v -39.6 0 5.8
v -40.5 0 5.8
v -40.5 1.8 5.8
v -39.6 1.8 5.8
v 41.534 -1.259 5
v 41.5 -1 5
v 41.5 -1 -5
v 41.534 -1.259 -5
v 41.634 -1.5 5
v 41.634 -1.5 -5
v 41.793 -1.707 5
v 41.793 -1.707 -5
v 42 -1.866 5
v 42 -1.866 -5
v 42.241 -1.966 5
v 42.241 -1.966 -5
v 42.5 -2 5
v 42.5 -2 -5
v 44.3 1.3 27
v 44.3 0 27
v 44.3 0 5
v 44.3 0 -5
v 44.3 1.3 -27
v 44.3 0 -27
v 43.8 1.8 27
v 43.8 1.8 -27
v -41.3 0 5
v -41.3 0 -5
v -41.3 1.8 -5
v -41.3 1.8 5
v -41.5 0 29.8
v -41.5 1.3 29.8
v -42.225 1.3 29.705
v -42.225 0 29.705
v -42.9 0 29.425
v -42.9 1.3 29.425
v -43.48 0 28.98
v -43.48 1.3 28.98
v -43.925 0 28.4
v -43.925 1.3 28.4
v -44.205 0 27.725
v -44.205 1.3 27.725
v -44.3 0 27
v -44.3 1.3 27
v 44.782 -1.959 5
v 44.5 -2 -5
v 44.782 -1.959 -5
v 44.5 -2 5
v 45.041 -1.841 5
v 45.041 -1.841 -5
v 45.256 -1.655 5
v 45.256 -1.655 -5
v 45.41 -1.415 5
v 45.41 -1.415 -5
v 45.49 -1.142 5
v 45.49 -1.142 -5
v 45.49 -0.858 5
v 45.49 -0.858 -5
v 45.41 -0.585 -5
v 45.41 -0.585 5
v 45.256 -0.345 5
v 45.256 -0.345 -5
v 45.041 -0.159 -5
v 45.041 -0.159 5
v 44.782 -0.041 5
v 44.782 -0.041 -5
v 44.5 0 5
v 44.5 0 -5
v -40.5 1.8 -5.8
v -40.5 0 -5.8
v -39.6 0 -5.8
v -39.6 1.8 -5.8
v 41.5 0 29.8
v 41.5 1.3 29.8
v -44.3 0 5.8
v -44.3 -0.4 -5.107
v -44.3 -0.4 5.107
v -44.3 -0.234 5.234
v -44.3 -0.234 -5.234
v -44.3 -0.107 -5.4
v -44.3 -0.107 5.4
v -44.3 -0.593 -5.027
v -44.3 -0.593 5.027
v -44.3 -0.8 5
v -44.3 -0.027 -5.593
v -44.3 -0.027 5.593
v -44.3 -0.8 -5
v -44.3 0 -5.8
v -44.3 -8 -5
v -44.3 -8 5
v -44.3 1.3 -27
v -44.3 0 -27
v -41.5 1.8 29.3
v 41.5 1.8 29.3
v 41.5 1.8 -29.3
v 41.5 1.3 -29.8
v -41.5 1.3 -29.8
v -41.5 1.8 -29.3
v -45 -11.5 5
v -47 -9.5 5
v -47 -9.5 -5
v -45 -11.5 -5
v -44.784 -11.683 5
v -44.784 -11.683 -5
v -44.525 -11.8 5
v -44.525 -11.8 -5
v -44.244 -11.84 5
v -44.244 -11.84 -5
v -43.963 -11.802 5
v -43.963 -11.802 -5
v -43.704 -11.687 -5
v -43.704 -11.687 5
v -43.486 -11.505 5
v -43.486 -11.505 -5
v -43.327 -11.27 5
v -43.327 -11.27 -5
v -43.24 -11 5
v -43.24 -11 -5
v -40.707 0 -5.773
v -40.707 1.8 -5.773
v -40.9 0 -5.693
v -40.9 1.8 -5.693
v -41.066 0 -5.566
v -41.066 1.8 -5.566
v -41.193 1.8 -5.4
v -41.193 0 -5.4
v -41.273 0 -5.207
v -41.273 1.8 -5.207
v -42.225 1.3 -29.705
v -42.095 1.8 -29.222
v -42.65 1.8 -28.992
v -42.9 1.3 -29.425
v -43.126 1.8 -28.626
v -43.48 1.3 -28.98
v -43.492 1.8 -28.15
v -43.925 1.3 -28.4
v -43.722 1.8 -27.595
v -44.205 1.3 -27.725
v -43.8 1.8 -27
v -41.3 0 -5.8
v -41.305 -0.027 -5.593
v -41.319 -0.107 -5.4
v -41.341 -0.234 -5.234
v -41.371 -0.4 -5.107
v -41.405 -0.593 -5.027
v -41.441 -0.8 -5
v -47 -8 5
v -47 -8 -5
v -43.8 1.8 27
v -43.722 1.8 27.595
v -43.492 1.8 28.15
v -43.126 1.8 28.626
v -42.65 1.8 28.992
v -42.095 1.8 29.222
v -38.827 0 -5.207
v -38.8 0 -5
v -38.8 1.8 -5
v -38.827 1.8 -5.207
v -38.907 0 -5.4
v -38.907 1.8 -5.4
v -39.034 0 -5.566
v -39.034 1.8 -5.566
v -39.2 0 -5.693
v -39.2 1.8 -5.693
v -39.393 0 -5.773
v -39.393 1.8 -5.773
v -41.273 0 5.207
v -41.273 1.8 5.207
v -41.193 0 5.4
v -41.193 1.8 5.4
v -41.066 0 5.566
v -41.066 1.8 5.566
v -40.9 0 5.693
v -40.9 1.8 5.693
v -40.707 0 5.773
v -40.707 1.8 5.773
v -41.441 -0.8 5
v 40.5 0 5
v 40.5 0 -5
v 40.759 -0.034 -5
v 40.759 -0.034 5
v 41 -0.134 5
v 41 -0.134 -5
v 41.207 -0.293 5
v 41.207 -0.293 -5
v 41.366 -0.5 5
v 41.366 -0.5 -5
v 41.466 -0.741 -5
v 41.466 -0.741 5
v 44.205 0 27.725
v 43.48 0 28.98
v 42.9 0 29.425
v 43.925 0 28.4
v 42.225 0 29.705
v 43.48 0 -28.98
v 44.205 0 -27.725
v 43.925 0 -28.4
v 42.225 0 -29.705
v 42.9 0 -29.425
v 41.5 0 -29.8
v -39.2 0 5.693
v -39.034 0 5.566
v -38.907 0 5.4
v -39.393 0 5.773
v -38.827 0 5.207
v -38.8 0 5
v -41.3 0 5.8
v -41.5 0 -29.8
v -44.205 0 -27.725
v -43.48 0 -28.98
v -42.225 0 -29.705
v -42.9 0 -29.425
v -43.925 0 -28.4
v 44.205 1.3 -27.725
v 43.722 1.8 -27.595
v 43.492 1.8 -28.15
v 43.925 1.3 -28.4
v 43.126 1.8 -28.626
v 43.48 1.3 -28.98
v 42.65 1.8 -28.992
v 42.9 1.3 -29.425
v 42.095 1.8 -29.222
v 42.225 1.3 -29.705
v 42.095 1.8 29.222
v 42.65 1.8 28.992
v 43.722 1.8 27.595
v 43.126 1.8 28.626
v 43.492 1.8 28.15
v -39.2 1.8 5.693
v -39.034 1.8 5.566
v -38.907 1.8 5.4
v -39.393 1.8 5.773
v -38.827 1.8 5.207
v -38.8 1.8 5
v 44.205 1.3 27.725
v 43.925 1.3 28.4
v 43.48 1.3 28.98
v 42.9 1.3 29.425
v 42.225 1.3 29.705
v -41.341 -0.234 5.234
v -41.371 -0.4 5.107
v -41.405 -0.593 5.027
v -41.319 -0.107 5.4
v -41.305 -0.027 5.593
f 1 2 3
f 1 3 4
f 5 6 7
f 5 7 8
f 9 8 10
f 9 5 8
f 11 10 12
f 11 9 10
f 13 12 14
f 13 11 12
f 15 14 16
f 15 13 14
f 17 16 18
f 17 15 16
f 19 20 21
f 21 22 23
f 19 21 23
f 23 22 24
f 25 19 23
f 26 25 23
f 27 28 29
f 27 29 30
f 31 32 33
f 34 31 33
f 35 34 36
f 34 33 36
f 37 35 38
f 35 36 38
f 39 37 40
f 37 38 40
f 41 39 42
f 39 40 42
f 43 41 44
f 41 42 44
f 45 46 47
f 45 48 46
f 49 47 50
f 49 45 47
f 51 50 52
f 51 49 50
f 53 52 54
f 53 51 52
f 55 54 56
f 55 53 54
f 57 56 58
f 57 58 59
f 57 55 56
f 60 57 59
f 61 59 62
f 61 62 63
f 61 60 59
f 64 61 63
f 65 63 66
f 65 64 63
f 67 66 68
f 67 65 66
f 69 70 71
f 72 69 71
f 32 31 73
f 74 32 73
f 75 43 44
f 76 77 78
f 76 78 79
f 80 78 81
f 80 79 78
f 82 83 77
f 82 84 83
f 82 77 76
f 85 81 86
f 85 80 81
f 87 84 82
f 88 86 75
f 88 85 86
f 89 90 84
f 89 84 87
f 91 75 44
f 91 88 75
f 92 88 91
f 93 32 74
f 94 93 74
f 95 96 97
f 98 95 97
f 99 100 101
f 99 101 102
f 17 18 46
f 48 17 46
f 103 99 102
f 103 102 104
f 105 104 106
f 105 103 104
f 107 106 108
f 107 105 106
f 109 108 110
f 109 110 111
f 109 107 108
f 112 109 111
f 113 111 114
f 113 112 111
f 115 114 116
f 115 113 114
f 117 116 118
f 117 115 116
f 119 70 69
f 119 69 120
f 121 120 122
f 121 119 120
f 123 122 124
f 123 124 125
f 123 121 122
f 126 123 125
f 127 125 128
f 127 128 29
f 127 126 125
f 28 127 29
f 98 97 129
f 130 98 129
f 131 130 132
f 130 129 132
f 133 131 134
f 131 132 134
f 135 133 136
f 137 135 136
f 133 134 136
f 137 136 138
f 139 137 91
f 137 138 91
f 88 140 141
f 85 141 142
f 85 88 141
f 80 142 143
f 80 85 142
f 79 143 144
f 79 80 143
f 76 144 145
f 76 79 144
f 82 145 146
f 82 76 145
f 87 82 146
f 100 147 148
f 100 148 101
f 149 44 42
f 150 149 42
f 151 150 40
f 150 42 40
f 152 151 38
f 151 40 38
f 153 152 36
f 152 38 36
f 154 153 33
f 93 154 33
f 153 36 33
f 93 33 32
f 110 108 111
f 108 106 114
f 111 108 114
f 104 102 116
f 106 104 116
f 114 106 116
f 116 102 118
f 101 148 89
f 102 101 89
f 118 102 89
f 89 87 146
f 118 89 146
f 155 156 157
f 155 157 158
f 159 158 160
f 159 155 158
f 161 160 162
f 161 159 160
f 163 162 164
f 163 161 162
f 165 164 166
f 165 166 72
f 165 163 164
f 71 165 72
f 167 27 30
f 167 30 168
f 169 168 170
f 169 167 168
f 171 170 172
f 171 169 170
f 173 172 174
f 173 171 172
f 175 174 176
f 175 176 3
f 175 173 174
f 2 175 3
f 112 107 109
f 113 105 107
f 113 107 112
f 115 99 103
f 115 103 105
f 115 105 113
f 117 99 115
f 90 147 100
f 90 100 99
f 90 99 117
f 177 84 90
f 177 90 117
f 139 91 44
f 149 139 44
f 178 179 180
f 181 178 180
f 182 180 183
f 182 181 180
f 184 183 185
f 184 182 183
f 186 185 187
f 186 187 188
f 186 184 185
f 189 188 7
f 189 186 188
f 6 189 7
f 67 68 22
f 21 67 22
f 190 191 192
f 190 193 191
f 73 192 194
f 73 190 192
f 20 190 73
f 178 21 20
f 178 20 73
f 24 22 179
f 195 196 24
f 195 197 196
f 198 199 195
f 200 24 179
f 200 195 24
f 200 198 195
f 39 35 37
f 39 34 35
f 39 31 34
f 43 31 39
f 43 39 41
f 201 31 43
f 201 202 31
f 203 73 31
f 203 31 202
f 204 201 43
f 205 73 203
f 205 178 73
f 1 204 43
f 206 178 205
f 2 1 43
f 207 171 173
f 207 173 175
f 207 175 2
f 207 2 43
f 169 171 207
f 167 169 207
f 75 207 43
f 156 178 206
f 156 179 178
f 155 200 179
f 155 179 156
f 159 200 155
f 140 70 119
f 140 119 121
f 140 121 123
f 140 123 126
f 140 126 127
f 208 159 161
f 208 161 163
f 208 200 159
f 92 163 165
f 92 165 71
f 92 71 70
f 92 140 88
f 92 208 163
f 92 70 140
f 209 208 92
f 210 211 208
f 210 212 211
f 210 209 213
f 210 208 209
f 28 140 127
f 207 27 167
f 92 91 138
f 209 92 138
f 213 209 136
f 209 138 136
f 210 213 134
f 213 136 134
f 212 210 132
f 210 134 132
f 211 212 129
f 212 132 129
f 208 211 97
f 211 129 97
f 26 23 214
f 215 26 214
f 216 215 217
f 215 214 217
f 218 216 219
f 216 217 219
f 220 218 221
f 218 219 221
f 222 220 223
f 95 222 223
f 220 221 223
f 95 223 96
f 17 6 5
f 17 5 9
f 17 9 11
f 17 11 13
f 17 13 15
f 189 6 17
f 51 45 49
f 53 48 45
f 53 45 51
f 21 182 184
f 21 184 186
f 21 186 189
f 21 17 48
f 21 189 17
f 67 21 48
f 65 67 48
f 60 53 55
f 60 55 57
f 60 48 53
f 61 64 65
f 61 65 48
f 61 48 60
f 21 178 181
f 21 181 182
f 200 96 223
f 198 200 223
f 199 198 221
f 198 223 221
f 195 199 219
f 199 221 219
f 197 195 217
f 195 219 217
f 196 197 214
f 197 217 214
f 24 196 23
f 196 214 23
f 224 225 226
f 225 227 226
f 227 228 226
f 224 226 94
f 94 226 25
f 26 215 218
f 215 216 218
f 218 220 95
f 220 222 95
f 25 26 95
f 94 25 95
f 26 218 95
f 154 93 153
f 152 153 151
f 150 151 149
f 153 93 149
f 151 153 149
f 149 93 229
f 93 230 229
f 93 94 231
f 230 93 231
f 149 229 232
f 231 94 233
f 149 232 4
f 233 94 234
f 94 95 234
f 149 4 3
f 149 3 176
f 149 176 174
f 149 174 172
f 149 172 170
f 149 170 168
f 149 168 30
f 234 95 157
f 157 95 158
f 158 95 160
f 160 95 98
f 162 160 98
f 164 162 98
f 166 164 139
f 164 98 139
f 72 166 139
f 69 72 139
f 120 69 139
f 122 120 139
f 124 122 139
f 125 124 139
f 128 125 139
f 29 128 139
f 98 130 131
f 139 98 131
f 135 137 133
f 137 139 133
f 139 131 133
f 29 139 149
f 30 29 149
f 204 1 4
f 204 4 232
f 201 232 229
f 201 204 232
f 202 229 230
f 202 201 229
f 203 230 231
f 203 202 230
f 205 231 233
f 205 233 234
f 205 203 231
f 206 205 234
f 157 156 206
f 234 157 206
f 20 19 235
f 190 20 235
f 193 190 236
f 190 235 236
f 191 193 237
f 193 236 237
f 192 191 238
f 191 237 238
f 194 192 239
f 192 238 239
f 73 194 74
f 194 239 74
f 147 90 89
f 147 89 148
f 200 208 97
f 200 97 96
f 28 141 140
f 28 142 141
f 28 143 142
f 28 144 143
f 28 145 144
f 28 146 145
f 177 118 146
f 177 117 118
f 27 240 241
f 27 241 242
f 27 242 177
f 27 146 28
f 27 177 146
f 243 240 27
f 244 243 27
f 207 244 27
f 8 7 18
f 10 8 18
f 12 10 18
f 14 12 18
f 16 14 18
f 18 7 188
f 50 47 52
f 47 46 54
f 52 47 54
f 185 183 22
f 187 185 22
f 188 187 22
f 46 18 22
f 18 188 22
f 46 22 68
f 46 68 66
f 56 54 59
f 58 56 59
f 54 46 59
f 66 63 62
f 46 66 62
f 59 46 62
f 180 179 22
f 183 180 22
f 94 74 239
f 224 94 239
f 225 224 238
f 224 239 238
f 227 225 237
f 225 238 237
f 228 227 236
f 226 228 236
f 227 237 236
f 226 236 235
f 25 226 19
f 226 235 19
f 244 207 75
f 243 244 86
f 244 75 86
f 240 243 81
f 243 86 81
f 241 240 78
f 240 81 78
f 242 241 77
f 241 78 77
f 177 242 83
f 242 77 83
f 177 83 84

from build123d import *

# Parameters (mm, degrees)
SKIZZE1_W                       = 88.6
SKIZZE1_H                       = 59.6
AUFSATZ_LINEAR_AUSTRAGEN1_DEPTH = 1.8
SCHNITT_LINEAR_AUSTRAGEN1_DEPTH = 54.420688876
FASE1_SIZE                      = 0.5
AUFSATZ_LINEAR_AUSTRAGEN2_DEPTH = 5
AUFSATZ_LINEAR_AUSTRAGEN3_DEPTH = 5
VERRUNDUNG1_R                   = 0.8
SKIZZE5_W                       = 2.5
SKIZZE5_H                       = 11.6
SCHNITT_LINEAR_AUSTRAGEN2_DEPTH = 57.896671713
VERRUNDUNG2_R                   = 0.8


with BuildPart() as part:
    # Skizze1 → Aufsatz-Linear austragen1 (new body)
    with BuildSketch(Plane(origin=(0, 0, 0), x_dir=(1, 0, 0), z_dir=(0, 1, 0))):
        Rectangle(SKIZZE1_W, SKIZZE1_H)
    extrude(amount=AUFSATZ_LINEAR_AUSTRAGEN1_DEPTH)

    # Skizze2 → Schnitt-Linear austragen1 (cut, through all)
    with BuildSketch(Plane(origin=(0, 1.8, 0), x_dir=(1, 0, 0), z_dir=(0, 1, 0))):
        with BuildLine():
            Line((-44.3, -29.8), (-41.5, -29.8))
            ThreePointArc((-41.5, -29.8), (-43.479898987, -28.979898987), (-44.3, -27))
            Line((-44.3, -27), (-44.3, -29.8))
        make_face()
        with BuildLine():
            Line((41.5, -29.8), (44.3, -29.8))
            Line((44.3, -29.8), (44.3, -27))
            ThreePointArc((44.3, -27), (43.479898987, -28.979898987), (41.5, -29.8))
        make_face()
        with BuildLine():
            ThreePointArc((41.5, 29.8), (43.479898987, 28.979898987), (44.3, 27))
            Line((44.3, 27), (44.3, 29.8))
            Line((44.3, 29.8), (41.5, 29.8))
        make_face()
        with BuildLine():
            ThreePointArc((-44.3, 27), (-43.479898987, 28.979898987), (-41.5, 29.8))
            Line((-41.5, 29.8), (-44.3, 29.8))
            Line((-44.3, 29.8), (-44.3, 27))
        make_face()
    extrude(amount=-SCHNITT_LINEAR_AUSTRAGEN1_DEPTH, mode=Mode.SUBTRACT)

    # Fase1
    fase1_edges = [part.edges().sort_by_distance(p)[0] for p in [
        (44.3, 1.8, 0),
        (0, 1.8, -29.8),
        (-44.3, 1.8, 0),
        (0, 1.8, 29.8),
        (-43.479898987, 1.8, -28.979898987),
        (43.479898987, 1.8, -28.979898987),
        (43.479898987, 1.8, 28.979898987),
        (-43.479898987, 1.8, 28.979898987),
    ]]
    chamfer(fase1_edges, length=FASE1_SIZE)

    # Skizze3 → Aufsatz-Linear austragen2 (add, symmetric)
    with BuildSketch(Plane.XY):
        with BuildLine():
            Line((44.5, 0), (40.5, 0))
            ThreePointArc((40.5, 0), (41.207106781, -0.292893219), (41.5, -1))
            ThreePointArc((41.5, -1), (41.792893219, -1.707106781), (42.5, -2))
            Line((42.5, -2), (44.5, -2))
            ThreePointArc((44.5, -2), (45.5, -1), (44.5, 0))
        make_face()
    extrude(amount=AUFSATZ_LINEAR_AUSTRAGEN2_DEPTH, both=True)

    # Skizze4 → Aufsatz-Linear austragen3 (add, symmetric)
    with BuildSketch(Plane.XY):
        with BuildLine():
            Line((-44.3, 0), (-44.3, -8))
            Line((-44.3, -8), (-47, -8))
            Line((-47, -8), (-47, -9.5))
            Line((-47, -9.5), (-45, -11.5))
            ThreePointArc((-45, -11.5), (-43.963143632, -11.801551092), (-43.239596788, -11))
            Line((-43.239596788, -11), (-41.3, 0))
            Line((-41.3, 0), (-44.3, 0))
        make_face()
    extrude(amount=AUFSATZ_LINEAR_AUSTRAGEN3_DEPTH, both=True)

    # Verrundung1
    verrundung1_edges = [part.edges().sort_by_distance(p)[0] for p in [
        (-42.8, 0, -5),
        (-42.8, 0, 5),
    ]]
    fillet(verrundung1_edges, radius=VERRUNDUNG1_R)

    # Skizze5 → Schnitt-Linear austragen2 (cut, through all)
    with BuildSketch(Plane.XZ):
        with Locations((-40.05, 0)):
            Rectangle(SKIZZE5_W, SKIZZE5_H)
    extrude(amount=-SCHNITT_LINEAR_AUSTRAGEN2_DEPTH, mode=Mode.SUBTRACT)

    # Verrundung2
    # the kernel refuses this fillet: 0.8 mm, written as the material it adds along each edge
    with BuildSketch(Plane(origin=(-41.3, 0, -5.8), x_dir=(1, 0, 0), z_dir=(0, 1, 0))) as verrundung2_piece_1:
        with BuildLine():
            CenterArc((VERRUNDUNG2_R, -VERRUNDUNG2_R), VERRUNDUNG2_R, 90, 90)
            Line((0, -VERRUNDUNG2_R), (0, 0))
            Line((0, 0), (VERRUNDUNG2_R, 0))
        make_face()
    extrude(amount=1.8)
    with BuildSketch(Plane(origin=(-41.3, 0, 5.8), x_dir=(1, 0, 0), z_dir=(0, 1, 0)), Plane(origin=(-38.8, 0, 5.8), x_dir=(0, 0, -1), z_dir=(0, 1, 0)), Plane(origin=(-38.8, 0, -5.8), x_dir=(-1, 0, 0), z_dir=(0, 1, 0))) as verrundung2_piece_2:
        with BuildLine():
            CenterArc((VERRUNDUNG2_R, VERRUNDUNG2_R), VERRUNDUNG2_R, 180, 90)
            Line((0, VERRUNDUNG2_R), (0, 0))
            Line((0, 0), (VERRUNDUNG2_R, 0))
        make_face()
    extrude(amount=1.8)


solid = part.part
